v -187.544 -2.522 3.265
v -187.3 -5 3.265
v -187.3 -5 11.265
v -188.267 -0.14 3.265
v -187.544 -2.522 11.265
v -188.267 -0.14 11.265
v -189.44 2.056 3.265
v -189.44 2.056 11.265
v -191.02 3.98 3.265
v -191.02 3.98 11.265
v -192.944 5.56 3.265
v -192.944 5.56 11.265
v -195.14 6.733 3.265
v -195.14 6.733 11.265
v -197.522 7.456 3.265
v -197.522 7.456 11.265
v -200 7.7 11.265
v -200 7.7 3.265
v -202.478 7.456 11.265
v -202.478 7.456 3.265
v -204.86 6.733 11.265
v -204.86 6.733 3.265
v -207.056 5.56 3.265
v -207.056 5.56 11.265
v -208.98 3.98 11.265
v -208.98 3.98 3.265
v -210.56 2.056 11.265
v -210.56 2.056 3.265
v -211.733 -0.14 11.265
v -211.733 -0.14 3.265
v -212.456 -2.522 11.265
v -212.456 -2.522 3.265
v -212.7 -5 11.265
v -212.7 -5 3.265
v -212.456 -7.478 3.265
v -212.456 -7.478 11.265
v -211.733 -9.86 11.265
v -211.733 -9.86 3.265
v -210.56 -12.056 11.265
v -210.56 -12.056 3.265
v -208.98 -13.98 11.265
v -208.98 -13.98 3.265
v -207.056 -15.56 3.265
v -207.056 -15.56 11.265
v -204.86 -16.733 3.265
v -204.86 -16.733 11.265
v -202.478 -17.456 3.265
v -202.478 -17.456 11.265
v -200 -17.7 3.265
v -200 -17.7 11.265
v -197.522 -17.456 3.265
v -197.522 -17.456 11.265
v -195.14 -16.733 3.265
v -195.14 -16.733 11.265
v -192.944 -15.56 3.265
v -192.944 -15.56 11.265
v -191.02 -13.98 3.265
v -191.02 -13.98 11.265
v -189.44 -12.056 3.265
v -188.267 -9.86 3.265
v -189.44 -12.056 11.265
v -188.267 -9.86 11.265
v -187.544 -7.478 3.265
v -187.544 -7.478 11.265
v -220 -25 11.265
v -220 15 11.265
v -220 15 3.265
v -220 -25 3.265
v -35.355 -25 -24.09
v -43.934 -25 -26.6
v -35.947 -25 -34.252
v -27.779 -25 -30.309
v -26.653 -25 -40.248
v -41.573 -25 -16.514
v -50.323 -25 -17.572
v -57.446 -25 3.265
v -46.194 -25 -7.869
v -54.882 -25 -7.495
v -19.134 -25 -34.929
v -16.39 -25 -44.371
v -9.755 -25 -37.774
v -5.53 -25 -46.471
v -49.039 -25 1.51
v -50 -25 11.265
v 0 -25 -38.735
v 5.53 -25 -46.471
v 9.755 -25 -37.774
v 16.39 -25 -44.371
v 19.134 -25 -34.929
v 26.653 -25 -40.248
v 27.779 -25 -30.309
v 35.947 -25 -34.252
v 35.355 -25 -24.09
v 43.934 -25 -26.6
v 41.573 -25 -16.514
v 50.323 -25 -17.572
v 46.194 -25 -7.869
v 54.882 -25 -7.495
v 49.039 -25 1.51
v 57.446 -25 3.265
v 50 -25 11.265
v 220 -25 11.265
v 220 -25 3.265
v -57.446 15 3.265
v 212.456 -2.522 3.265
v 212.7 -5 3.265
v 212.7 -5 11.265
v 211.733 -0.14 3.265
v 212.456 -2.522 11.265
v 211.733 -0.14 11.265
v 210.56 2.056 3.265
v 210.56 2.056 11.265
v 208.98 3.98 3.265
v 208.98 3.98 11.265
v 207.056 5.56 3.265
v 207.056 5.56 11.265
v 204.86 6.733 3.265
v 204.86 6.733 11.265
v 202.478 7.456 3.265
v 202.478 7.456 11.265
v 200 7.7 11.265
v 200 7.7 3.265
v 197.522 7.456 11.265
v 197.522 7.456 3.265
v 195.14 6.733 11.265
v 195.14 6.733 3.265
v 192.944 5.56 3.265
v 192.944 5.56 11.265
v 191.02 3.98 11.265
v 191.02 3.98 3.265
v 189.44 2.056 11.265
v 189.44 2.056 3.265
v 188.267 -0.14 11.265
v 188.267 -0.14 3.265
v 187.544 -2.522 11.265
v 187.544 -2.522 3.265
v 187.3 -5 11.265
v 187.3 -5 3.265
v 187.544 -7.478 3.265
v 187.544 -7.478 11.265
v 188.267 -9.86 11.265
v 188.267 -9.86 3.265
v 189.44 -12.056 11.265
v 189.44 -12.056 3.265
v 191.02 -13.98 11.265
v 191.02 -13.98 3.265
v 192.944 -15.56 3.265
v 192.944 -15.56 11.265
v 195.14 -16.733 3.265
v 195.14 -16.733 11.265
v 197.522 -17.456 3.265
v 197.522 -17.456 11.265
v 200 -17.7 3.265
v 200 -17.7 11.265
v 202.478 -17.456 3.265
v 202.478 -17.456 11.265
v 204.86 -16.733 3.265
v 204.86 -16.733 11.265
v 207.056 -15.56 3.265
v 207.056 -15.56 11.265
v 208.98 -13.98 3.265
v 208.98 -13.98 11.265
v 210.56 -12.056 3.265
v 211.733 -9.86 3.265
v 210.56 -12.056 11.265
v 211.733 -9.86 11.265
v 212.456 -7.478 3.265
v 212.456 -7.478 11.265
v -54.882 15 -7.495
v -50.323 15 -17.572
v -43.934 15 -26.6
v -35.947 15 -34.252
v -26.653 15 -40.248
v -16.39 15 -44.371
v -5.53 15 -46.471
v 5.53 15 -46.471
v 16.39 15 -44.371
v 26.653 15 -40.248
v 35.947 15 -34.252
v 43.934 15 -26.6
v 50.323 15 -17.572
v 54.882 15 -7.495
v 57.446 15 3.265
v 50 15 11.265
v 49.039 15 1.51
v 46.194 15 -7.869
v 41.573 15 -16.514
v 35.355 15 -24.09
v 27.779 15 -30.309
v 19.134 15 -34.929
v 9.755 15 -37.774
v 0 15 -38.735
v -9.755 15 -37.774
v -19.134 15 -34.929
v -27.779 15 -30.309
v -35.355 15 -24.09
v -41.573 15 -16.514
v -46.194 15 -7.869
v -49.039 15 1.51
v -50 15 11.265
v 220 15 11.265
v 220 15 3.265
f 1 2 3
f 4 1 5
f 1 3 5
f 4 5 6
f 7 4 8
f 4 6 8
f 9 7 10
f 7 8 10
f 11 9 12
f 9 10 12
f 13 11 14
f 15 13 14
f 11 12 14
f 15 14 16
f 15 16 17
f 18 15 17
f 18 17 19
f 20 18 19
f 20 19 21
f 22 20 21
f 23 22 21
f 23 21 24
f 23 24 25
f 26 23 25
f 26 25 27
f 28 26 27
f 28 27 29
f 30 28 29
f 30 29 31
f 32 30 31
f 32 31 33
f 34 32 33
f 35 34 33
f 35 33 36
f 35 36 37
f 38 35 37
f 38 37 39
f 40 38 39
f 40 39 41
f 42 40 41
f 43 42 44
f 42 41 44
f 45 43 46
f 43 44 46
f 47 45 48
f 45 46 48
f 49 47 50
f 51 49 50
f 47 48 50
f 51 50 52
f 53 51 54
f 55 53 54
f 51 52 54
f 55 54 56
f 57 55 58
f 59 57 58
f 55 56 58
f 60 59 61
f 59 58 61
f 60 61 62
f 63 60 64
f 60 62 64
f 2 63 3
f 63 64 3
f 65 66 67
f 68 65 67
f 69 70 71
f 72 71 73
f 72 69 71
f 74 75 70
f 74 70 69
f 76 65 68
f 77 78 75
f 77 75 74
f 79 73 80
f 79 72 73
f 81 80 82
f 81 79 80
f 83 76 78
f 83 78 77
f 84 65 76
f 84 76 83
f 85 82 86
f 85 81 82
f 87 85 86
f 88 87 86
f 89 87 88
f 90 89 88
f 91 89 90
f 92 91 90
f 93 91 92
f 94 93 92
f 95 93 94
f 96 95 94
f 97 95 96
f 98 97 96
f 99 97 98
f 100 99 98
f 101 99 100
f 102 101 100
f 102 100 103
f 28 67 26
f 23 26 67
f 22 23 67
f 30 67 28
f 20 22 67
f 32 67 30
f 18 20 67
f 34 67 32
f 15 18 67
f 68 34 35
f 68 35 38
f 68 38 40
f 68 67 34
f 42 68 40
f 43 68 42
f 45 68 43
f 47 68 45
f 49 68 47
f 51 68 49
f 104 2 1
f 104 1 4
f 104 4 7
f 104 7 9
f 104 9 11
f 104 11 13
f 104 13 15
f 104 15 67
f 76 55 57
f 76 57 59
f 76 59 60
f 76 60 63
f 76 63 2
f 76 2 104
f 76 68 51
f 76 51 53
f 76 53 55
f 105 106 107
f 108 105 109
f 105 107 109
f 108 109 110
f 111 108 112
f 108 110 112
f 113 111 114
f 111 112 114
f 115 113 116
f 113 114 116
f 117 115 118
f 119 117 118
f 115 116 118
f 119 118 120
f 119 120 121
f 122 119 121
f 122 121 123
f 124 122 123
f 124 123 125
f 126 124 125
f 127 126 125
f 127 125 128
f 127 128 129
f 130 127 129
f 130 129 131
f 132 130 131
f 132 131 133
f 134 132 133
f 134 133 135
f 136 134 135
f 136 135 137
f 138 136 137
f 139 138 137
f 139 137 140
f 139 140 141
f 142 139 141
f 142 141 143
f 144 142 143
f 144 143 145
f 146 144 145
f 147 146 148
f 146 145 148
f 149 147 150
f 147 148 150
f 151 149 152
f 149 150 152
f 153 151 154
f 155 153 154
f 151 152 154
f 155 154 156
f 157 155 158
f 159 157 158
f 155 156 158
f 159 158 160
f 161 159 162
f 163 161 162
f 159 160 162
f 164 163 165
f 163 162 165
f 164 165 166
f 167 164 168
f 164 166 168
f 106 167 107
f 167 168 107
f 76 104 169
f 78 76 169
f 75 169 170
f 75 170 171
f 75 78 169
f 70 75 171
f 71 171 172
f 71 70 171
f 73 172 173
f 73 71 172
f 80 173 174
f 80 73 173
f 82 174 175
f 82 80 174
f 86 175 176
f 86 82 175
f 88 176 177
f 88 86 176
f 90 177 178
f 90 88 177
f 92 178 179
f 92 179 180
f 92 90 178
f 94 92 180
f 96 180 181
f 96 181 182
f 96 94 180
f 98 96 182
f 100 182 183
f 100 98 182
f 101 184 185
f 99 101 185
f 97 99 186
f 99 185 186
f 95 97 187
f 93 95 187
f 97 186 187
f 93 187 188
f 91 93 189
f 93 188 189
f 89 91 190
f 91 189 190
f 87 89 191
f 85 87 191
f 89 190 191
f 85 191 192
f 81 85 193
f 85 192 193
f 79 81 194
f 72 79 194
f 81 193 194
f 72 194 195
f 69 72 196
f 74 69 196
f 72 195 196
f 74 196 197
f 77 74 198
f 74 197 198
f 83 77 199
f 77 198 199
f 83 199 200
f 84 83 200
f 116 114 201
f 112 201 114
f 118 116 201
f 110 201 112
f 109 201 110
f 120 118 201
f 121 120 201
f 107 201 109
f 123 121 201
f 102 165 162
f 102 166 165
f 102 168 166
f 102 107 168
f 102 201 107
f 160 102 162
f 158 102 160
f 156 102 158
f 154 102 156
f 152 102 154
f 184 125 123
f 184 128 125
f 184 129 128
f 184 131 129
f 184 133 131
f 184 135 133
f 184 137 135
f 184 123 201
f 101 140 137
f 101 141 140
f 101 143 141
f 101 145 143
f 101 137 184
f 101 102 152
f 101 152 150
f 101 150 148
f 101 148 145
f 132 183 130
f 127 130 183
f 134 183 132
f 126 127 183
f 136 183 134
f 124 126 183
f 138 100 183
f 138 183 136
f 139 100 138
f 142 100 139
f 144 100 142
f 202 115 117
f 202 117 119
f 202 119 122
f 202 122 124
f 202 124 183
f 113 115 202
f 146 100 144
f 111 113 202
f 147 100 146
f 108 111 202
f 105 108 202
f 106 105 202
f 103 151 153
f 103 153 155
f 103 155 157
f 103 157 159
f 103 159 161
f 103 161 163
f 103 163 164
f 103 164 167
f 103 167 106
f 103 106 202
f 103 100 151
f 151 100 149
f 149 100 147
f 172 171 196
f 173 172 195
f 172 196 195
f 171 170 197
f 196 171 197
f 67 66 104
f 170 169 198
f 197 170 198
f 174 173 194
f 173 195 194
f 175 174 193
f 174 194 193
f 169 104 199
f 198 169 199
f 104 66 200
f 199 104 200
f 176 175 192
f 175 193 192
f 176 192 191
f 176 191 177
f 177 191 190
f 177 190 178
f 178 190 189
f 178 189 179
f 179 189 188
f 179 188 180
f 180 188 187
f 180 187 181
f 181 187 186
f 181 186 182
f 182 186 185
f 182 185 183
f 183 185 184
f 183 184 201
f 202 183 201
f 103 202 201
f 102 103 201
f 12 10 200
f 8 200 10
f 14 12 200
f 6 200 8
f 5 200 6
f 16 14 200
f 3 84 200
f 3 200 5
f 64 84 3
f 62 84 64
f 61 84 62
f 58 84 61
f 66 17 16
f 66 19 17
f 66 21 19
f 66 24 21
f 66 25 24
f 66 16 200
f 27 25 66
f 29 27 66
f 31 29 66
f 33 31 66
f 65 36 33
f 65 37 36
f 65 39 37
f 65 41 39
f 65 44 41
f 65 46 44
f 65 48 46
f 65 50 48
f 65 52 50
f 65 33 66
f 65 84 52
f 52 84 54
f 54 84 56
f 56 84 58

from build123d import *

# Parameters (mm, degrees)
BOSS_EXTRUDE1_DEPTH            = 10
HOLE1_D                        = 6.35
HOLE1_DEPTH                    = 2
F_25_0_25_DIAMETER_HOLE1_D     = 25
F_25_0_25_DIAMETER_HOLE1_DEPTH = 10
SCALE1_SCALE                   = 4


with BuildPart() as part:
    # Sketch1 → Boss-Extrude1 (new body)
    with BuildSketch(Plane.XZ.offset(10)):
        with BuildLine():
            Line((55, 0), (-55, 0))
            Line((-55, 0), (-55, -2))
            Line((-55, -2), (-14.361406616, -2))
            ThreePointArc((-14.361406616, -2), (0, -14.5), (14.361406616, -2))
            Line((14.361406616, -2), (55, -2))
            Line((55, -2), (55, 0))
        make_face()
    extrude(amount=-BOSS_EXTRUDE1_DEPTH)

    # Hole1
    with Locations(Plane(origin=(0, 0, -2), x_dir=(-1, 0, 0), z_dir=(0, 0, -1))):
        with Locations((-50, -5), (50, -5)):
            Hole(HOLE1_D / 2, depth=HOLE1_DEPTH)

    # Ø25.0 (25) Diameter Hole1
    with Locations(Plane(origin=(0, -10, 0), x_dir=(-1, 0, 0), z_dir=(0, -1, 0))):
        with Locations((0, 0)):
            Hole(F_25_0_25_DIAMETER_HOLE1_D / 2, depth=F_25_0_25_DIAMETER_HOLE1_DEPTH)


with BuildPart() as part_1:
    # Scale1: scaled about (0, -5, -3.754985593)
    add(part.part.scale(SCALE1_SCALE).moved(Location((0, 15, 11.264956779))))


solid = part_1.part
